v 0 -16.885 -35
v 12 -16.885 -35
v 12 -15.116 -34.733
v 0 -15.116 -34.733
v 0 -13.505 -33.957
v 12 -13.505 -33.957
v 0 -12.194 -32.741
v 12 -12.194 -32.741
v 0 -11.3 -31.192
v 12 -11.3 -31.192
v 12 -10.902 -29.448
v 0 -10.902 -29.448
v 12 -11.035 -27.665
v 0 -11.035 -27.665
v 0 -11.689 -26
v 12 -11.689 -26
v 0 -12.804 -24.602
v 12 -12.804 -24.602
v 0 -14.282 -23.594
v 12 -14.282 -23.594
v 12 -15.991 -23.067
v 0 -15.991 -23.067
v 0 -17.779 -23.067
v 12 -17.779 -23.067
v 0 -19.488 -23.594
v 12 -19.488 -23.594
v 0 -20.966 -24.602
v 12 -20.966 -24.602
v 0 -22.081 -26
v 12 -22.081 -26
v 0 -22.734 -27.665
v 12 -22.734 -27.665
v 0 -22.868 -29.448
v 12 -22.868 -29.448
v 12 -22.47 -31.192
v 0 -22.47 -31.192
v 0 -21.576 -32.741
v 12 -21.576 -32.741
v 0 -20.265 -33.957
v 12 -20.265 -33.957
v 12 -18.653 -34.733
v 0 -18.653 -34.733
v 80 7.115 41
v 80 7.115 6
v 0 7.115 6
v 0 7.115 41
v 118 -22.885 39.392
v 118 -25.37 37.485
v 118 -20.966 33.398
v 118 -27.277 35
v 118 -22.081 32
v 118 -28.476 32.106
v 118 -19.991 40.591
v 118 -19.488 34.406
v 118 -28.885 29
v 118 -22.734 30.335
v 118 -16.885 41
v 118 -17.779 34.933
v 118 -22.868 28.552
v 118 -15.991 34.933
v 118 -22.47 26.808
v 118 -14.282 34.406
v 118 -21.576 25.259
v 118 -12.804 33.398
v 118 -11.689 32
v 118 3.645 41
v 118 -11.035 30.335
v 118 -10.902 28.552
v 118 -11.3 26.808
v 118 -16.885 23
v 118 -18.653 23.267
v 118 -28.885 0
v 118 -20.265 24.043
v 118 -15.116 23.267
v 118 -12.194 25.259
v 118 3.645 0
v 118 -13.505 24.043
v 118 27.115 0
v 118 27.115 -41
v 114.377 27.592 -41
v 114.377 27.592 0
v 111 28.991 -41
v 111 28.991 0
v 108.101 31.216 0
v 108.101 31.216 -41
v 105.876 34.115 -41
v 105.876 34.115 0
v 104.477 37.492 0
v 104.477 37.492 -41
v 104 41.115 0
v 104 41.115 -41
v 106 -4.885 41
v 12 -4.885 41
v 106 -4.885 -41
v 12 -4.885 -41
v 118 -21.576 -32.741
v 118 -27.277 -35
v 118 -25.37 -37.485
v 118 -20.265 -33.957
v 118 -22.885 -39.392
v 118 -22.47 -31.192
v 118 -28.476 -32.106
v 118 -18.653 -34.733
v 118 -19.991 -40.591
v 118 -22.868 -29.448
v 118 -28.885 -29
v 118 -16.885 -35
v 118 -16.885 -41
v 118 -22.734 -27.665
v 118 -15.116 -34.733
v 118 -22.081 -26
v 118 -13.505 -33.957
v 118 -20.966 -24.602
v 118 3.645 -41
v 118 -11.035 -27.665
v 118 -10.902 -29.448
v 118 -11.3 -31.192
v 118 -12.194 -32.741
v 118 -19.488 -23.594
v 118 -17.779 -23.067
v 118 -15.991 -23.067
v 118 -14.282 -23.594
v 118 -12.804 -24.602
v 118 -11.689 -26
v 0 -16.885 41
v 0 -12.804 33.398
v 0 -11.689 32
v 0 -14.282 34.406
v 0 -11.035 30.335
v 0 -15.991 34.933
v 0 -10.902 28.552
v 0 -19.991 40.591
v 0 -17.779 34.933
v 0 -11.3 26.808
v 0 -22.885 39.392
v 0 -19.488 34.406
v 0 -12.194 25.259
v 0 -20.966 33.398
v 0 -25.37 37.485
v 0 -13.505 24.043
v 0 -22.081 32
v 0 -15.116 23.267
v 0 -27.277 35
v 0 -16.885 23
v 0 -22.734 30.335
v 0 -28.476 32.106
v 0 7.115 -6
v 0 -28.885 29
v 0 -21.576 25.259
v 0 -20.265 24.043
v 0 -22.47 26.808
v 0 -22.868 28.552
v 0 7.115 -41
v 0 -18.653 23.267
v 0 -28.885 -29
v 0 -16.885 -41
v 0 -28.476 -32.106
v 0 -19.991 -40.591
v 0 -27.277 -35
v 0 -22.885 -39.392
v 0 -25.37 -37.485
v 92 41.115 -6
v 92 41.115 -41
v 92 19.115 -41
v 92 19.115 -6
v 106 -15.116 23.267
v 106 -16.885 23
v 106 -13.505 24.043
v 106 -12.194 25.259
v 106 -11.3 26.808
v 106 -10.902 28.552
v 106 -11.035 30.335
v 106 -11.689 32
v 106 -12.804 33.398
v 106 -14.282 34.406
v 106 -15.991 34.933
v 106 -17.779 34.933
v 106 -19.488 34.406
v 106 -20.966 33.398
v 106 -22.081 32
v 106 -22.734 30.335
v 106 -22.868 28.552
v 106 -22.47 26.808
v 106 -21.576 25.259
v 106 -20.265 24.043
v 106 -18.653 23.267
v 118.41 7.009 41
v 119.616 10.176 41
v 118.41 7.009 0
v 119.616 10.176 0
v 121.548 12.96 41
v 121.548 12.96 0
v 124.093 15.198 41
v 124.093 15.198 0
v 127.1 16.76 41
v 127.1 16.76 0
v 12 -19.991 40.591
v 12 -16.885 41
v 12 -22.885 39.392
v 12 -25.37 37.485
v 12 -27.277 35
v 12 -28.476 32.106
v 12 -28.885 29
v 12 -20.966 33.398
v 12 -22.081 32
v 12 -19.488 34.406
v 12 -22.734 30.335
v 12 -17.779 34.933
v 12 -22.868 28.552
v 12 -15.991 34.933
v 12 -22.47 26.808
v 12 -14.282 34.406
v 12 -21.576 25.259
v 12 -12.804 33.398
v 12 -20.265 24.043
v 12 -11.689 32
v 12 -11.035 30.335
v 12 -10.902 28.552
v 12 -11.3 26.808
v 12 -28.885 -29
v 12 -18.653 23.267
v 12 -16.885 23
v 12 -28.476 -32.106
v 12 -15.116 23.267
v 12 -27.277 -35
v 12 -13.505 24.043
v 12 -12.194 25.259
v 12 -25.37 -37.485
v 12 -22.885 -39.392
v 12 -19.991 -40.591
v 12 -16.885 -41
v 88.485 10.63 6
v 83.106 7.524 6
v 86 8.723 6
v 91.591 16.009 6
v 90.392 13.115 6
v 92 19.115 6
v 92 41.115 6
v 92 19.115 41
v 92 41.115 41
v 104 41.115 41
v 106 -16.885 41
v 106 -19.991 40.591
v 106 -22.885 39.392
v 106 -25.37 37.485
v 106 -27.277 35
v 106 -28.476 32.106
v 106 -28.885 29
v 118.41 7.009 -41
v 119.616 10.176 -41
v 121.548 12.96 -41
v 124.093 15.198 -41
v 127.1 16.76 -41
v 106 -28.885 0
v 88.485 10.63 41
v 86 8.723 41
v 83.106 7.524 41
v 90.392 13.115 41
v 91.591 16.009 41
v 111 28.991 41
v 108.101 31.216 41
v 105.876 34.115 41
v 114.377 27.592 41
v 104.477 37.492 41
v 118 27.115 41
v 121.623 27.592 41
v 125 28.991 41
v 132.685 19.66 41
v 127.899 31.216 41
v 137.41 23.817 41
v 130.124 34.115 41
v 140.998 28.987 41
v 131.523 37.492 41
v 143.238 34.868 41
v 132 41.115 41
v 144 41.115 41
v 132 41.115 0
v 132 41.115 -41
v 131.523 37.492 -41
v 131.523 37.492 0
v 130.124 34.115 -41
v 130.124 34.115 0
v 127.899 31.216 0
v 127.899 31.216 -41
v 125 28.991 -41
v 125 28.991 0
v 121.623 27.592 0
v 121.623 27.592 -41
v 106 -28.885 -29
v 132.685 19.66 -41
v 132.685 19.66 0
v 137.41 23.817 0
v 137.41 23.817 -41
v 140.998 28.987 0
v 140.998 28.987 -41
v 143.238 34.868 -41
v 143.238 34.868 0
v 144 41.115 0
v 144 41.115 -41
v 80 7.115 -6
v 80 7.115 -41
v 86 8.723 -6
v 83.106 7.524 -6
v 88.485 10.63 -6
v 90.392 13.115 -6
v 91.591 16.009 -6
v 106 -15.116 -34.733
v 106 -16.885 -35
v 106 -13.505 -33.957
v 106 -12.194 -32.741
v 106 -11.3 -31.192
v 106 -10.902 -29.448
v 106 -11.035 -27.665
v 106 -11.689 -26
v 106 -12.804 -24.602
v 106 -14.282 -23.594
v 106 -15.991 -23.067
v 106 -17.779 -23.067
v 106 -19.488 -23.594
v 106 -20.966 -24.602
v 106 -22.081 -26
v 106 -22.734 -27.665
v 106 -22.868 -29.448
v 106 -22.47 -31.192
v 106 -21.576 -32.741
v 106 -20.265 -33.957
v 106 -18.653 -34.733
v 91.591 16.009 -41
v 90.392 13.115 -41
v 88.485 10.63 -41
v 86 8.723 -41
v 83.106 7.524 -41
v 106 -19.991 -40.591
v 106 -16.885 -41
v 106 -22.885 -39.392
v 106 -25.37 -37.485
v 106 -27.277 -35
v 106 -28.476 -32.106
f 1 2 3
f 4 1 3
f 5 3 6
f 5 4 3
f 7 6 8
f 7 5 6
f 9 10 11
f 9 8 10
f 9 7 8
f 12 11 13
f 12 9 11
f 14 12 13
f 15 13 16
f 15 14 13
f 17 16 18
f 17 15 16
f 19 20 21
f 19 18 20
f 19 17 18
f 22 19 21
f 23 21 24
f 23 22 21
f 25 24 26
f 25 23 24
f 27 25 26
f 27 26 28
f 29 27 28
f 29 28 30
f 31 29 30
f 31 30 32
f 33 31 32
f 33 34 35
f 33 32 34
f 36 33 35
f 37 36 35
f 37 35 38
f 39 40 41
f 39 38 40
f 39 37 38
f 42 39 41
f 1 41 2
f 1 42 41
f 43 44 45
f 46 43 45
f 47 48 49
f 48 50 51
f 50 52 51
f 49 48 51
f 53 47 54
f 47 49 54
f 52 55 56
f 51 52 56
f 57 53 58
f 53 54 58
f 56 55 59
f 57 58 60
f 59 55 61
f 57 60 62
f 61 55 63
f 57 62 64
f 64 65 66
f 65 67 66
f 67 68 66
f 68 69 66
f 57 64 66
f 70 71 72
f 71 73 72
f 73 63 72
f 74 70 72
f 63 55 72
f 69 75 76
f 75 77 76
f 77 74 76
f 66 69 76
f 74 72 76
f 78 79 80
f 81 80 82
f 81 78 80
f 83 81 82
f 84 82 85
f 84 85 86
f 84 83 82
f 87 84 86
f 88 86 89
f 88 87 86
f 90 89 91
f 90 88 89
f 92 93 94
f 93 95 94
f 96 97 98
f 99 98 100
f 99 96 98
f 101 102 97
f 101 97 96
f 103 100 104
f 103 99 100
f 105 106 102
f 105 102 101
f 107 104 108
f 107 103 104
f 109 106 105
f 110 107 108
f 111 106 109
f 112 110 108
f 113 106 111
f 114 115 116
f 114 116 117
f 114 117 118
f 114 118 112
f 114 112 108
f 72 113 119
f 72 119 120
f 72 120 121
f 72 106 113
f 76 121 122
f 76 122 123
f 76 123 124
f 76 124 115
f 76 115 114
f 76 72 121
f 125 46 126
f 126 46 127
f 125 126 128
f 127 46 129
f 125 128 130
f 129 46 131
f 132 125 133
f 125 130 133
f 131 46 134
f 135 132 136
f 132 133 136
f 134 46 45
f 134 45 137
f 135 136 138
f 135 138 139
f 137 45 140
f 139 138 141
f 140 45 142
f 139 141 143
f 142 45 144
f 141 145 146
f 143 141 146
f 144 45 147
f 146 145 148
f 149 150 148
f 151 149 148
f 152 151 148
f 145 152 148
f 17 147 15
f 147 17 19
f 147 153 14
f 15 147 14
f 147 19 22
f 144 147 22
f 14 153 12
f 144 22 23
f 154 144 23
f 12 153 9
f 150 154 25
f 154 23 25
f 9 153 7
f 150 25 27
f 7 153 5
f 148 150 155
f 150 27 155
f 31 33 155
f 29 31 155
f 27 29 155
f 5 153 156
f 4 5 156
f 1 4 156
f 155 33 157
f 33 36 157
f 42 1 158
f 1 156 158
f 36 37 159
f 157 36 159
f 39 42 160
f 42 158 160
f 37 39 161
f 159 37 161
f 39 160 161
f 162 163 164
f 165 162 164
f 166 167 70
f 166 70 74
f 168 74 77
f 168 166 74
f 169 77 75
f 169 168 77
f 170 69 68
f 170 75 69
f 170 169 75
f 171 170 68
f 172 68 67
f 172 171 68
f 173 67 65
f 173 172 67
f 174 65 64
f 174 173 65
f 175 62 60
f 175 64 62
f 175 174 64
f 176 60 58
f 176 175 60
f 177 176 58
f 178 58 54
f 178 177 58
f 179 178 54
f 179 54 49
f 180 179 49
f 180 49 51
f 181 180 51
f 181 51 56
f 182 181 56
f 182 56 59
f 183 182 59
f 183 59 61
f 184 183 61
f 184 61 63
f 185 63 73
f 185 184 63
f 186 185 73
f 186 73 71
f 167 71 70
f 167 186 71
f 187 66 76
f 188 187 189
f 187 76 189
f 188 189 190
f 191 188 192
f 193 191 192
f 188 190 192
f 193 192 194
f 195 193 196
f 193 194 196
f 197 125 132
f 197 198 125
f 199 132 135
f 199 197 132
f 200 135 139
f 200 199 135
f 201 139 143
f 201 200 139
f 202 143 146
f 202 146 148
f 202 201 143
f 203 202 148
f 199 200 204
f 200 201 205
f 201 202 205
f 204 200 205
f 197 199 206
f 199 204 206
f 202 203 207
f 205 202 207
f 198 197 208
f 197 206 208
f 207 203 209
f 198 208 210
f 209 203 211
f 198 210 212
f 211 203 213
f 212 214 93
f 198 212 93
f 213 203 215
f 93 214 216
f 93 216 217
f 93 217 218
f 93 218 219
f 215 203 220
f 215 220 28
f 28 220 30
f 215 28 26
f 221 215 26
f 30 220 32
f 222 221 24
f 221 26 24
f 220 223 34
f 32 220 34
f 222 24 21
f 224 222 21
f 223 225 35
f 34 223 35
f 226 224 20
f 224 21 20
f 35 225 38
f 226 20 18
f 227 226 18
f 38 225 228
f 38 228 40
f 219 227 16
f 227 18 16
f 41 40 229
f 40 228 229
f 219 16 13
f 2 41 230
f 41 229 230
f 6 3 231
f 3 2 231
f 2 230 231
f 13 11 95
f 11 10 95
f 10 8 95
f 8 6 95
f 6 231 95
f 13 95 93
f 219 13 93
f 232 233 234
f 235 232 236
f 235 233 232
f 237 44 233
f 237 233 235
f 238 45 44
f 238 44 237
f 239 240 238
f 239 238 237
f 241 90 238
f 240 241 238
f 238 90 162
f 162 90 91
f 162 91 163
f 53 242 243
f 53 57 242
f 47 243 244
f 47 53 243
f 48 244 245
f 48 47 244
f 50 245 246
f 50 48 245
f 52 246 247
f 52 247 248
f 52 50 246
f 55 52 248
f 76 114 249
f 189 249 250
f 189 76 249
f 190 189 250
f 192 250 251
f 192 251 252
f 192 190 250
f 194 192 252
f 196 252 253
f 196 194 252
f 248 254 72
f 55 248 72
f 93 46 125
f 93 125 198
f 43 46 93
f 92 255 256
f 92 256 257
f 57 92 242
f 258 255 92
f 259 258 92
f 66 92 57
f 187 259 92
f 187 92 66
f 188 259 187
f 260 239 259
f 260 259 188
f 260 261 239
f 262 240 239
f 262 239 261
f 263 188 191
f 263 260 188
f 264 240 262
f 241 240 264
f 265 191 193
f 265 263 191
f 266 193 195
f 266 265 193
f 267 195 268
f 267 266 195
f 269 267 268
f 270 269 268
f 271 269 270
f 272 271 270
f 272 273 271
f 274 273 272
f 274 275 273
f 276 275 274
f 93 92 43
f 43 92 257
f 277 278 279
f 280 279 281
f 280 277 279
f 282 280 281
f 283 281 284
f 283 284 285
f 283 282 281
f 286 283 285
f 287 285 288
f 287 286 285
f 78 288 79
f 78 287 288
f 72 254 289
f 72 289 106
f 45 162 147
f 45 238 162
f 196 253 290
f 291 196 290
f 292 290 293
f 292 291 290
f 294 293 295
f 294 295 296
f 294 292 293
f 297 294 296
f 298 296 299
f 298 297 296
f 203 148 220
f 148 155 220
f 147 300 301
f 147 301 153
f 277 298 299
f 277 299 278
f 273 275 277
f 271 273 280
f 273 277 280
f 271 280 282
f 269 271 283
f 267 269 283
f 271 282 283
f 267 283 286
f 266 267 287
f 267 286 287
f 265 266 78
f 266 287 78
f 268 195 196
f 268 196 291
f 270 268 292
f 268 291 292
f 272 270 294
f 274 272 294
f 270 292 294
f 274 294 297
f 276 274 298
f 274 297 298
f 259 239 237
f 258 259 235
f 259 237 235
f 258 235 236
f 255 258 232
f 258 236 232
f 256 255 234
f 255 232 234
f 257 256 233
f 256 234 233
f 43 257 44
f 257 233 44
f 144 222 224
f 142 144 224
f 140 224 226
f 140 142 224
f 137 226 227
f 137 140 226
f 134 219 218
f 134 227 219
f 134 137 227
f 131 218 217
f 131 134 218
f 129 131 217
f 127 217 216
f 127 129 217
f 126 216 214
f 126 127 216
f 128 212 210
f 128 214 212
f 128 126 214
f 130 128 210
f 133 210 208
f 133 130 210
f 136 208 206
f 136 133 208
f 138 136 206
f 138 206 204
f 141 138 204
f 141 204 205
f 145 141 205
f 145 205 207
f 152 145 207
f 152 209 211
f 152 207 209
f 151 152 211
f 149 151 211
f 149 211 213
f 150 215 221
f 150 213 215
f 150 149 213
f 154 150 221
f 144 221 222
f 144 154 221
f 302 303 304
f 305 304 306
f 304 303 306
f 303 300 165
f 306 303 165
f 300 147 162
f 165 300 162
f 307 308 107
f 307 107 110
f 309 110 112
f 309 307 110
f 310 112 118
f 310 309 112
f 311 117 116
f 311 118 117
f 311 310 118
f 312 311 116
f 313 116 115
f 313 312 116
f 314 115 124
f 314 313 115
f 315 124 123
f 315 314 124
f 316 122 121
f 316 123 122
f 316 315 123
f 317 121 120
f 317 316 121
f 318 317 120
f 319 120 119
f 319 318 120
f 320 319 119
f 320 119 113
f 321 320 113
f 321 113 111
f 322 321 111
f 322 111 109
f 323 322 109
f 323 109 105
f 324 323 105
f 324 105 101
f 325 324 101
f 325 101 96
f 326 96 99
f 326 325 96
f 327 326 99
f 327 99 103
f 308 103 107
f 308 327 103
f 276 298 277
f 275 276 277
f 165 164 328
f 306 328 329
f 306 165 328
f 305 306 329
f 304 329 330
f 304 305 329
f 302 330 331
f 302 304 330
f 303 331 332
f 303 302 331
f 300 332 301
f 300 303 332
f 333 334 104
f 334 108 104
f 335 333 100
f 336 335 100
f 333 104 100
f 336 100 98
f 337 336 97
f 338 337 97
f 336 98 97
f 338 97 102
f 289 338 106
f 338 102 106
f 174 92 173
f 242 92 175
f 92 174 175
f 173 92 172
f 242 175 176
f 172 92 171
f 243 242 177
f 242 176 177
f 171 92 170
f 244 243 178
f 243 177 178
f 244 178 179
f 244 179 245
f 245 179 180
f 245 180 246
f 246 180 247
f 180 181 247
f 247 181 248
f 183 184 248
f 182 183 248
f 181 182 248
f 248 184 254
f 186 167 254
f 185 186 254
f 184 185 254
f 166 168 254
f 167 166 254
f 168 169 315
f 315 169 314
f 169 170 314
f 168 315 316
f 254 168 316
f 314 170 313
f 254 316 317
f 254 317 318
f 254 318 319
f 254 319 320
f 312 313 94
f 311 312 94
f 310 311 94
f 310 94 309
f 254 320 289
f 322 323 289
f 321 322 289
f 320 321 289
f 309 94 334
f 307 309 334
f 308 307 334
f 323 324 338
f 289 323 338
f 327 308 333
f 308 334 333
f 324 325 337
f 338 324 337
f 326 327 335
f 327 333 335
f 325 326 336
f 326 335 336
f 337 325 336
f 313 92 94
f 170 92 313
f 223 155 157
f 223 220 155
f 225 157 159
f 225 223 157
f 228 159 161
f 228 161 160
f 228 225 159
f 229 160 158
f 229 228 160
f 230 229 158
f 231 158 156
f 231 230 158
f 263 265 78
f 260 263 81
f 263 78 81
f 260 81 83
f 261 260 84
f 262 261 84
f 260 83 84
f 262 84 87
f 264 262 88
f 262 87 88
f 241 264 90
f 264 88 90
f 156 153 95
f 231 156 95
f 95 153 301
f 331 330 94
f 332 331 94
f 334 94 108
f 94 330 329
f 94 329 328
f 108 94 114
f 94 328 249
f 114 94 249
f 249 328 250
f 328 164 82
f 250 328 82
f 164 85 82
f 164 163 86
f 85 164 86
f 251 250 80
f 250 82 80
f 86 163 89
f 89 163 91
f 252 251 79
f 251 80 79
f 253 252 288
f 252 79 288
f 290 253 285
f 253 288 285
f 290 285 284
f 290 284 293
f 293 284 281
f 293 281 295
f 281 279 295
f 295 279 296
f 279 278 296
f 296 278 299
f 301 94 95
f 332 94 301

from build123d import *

# Parameters (mm, degrees)
BOSS_EXTRUDE1_DEPTH     = 41
BOSS_EXTRUDE2_DEPTH     = 6
CUT_EXTRUDE1_DEPTH      = 132.512198268
CUT_EXTRUDE1_DEPTH_BACK = 132.512198268
SKETCH2_R               = 6
FILLET1_R               = 12


with BuildPart() as part:
    # Sketch1 → Boss-Extrude1 (new, symmetric)
    with BuildSketch(Plane.XY):
        with BuildLine():
            ThreePointArc((118, 3.645195256), (120.497826292, 11.626423231), (127.1, 16.759691052))
            ThreePointArc((127.1, 16.759691052), (139.361179743, 26.29290272), (144, 41.115183246))
            Line((144, 41.115183246), (132, 41.115183246))
            ThreePointArc((132, 41.115183246), (118, 27.115183246), (104, 41.115183246))
            Line((104, 41.115183246), (92, 41.115183246))
            Line((92, 41.115183246), (92, 19.115183246))
            ThreePointArc((92, 19.115183246), (88.485281374, 10.629901872), (80, 7.115183246))
            Line((80, 7.115183246), (0, 7.115183246))
            Line((0, 7.115183246), (0, -28.884816754))
            Line((0, -28.884816754), (12, -28.884816754))
            Line((12, -28.884816754), (12, -4.884816754))
            Line((12, -4.884816754), (106, -4.884816754))
            Line((106, -4.884816754), (106, -28.884816754))
            Line((106, -28.884816754), (118, -28.884816754))
            Line((118, -28.884816754), (118, 3.645195256))
        make_face()
    extrude(amount=BOSS_EXTRUDE1_DEPTH, both=True)

    # Sketch1<3> → Boss-Extrude2 (add, symmetric)
    with BuildSketch(Plane.XY):
        with BuildLine():
            Line((92, 41.115183246), (0, 7.115183246))
            Line((0, 7.115183246), (80, 7.115183246))
            ThreePointArc((80, 7.115183246), (88.485281374, 10.629901872), (92, 19.115183246))
            Line((92, 19.115183246), (92, 41.115183246))
        make_face()
    extrude(amount=BOSS_EXTRUDE2_DEPTH, both=True)

    # Sketch2 → Cut-Extrude1 (cut, two sides: drawn at the far end of the back side and taken through both)
    with BuildSketch(Plane(origin=(118, 0, 0), x_dir=(0, 0, -1), z_dir=(1, 0, 0)).offset(-CUT_EXTRUDE1_DEPTH_BACK)):
        with Locations((-29, -16.884816754)):
            Circle(SKETCH2_R)
        with Locations((29, -16.884816754)):
            Circle(SKETCH2_R)
    extrude(amount=CUT_EXTRUDE1_DEPTH + CUT_EXTRUDE1_DEPTH_BACK, mode=Mode.SUBTRACT)

    # Fillet1
    fillet1_edges = [part.edges().sort_by_distance(p)[0] for p in [
        (6, -28.884816754, -41),
        (6, -28.884816754, 41),
        (112, -28.884816754, -41),
        (112, -28.884816754, 41),
    ]]
    fillet(fillet1_edges, radius=FILLET1_R)


solid = part.part
